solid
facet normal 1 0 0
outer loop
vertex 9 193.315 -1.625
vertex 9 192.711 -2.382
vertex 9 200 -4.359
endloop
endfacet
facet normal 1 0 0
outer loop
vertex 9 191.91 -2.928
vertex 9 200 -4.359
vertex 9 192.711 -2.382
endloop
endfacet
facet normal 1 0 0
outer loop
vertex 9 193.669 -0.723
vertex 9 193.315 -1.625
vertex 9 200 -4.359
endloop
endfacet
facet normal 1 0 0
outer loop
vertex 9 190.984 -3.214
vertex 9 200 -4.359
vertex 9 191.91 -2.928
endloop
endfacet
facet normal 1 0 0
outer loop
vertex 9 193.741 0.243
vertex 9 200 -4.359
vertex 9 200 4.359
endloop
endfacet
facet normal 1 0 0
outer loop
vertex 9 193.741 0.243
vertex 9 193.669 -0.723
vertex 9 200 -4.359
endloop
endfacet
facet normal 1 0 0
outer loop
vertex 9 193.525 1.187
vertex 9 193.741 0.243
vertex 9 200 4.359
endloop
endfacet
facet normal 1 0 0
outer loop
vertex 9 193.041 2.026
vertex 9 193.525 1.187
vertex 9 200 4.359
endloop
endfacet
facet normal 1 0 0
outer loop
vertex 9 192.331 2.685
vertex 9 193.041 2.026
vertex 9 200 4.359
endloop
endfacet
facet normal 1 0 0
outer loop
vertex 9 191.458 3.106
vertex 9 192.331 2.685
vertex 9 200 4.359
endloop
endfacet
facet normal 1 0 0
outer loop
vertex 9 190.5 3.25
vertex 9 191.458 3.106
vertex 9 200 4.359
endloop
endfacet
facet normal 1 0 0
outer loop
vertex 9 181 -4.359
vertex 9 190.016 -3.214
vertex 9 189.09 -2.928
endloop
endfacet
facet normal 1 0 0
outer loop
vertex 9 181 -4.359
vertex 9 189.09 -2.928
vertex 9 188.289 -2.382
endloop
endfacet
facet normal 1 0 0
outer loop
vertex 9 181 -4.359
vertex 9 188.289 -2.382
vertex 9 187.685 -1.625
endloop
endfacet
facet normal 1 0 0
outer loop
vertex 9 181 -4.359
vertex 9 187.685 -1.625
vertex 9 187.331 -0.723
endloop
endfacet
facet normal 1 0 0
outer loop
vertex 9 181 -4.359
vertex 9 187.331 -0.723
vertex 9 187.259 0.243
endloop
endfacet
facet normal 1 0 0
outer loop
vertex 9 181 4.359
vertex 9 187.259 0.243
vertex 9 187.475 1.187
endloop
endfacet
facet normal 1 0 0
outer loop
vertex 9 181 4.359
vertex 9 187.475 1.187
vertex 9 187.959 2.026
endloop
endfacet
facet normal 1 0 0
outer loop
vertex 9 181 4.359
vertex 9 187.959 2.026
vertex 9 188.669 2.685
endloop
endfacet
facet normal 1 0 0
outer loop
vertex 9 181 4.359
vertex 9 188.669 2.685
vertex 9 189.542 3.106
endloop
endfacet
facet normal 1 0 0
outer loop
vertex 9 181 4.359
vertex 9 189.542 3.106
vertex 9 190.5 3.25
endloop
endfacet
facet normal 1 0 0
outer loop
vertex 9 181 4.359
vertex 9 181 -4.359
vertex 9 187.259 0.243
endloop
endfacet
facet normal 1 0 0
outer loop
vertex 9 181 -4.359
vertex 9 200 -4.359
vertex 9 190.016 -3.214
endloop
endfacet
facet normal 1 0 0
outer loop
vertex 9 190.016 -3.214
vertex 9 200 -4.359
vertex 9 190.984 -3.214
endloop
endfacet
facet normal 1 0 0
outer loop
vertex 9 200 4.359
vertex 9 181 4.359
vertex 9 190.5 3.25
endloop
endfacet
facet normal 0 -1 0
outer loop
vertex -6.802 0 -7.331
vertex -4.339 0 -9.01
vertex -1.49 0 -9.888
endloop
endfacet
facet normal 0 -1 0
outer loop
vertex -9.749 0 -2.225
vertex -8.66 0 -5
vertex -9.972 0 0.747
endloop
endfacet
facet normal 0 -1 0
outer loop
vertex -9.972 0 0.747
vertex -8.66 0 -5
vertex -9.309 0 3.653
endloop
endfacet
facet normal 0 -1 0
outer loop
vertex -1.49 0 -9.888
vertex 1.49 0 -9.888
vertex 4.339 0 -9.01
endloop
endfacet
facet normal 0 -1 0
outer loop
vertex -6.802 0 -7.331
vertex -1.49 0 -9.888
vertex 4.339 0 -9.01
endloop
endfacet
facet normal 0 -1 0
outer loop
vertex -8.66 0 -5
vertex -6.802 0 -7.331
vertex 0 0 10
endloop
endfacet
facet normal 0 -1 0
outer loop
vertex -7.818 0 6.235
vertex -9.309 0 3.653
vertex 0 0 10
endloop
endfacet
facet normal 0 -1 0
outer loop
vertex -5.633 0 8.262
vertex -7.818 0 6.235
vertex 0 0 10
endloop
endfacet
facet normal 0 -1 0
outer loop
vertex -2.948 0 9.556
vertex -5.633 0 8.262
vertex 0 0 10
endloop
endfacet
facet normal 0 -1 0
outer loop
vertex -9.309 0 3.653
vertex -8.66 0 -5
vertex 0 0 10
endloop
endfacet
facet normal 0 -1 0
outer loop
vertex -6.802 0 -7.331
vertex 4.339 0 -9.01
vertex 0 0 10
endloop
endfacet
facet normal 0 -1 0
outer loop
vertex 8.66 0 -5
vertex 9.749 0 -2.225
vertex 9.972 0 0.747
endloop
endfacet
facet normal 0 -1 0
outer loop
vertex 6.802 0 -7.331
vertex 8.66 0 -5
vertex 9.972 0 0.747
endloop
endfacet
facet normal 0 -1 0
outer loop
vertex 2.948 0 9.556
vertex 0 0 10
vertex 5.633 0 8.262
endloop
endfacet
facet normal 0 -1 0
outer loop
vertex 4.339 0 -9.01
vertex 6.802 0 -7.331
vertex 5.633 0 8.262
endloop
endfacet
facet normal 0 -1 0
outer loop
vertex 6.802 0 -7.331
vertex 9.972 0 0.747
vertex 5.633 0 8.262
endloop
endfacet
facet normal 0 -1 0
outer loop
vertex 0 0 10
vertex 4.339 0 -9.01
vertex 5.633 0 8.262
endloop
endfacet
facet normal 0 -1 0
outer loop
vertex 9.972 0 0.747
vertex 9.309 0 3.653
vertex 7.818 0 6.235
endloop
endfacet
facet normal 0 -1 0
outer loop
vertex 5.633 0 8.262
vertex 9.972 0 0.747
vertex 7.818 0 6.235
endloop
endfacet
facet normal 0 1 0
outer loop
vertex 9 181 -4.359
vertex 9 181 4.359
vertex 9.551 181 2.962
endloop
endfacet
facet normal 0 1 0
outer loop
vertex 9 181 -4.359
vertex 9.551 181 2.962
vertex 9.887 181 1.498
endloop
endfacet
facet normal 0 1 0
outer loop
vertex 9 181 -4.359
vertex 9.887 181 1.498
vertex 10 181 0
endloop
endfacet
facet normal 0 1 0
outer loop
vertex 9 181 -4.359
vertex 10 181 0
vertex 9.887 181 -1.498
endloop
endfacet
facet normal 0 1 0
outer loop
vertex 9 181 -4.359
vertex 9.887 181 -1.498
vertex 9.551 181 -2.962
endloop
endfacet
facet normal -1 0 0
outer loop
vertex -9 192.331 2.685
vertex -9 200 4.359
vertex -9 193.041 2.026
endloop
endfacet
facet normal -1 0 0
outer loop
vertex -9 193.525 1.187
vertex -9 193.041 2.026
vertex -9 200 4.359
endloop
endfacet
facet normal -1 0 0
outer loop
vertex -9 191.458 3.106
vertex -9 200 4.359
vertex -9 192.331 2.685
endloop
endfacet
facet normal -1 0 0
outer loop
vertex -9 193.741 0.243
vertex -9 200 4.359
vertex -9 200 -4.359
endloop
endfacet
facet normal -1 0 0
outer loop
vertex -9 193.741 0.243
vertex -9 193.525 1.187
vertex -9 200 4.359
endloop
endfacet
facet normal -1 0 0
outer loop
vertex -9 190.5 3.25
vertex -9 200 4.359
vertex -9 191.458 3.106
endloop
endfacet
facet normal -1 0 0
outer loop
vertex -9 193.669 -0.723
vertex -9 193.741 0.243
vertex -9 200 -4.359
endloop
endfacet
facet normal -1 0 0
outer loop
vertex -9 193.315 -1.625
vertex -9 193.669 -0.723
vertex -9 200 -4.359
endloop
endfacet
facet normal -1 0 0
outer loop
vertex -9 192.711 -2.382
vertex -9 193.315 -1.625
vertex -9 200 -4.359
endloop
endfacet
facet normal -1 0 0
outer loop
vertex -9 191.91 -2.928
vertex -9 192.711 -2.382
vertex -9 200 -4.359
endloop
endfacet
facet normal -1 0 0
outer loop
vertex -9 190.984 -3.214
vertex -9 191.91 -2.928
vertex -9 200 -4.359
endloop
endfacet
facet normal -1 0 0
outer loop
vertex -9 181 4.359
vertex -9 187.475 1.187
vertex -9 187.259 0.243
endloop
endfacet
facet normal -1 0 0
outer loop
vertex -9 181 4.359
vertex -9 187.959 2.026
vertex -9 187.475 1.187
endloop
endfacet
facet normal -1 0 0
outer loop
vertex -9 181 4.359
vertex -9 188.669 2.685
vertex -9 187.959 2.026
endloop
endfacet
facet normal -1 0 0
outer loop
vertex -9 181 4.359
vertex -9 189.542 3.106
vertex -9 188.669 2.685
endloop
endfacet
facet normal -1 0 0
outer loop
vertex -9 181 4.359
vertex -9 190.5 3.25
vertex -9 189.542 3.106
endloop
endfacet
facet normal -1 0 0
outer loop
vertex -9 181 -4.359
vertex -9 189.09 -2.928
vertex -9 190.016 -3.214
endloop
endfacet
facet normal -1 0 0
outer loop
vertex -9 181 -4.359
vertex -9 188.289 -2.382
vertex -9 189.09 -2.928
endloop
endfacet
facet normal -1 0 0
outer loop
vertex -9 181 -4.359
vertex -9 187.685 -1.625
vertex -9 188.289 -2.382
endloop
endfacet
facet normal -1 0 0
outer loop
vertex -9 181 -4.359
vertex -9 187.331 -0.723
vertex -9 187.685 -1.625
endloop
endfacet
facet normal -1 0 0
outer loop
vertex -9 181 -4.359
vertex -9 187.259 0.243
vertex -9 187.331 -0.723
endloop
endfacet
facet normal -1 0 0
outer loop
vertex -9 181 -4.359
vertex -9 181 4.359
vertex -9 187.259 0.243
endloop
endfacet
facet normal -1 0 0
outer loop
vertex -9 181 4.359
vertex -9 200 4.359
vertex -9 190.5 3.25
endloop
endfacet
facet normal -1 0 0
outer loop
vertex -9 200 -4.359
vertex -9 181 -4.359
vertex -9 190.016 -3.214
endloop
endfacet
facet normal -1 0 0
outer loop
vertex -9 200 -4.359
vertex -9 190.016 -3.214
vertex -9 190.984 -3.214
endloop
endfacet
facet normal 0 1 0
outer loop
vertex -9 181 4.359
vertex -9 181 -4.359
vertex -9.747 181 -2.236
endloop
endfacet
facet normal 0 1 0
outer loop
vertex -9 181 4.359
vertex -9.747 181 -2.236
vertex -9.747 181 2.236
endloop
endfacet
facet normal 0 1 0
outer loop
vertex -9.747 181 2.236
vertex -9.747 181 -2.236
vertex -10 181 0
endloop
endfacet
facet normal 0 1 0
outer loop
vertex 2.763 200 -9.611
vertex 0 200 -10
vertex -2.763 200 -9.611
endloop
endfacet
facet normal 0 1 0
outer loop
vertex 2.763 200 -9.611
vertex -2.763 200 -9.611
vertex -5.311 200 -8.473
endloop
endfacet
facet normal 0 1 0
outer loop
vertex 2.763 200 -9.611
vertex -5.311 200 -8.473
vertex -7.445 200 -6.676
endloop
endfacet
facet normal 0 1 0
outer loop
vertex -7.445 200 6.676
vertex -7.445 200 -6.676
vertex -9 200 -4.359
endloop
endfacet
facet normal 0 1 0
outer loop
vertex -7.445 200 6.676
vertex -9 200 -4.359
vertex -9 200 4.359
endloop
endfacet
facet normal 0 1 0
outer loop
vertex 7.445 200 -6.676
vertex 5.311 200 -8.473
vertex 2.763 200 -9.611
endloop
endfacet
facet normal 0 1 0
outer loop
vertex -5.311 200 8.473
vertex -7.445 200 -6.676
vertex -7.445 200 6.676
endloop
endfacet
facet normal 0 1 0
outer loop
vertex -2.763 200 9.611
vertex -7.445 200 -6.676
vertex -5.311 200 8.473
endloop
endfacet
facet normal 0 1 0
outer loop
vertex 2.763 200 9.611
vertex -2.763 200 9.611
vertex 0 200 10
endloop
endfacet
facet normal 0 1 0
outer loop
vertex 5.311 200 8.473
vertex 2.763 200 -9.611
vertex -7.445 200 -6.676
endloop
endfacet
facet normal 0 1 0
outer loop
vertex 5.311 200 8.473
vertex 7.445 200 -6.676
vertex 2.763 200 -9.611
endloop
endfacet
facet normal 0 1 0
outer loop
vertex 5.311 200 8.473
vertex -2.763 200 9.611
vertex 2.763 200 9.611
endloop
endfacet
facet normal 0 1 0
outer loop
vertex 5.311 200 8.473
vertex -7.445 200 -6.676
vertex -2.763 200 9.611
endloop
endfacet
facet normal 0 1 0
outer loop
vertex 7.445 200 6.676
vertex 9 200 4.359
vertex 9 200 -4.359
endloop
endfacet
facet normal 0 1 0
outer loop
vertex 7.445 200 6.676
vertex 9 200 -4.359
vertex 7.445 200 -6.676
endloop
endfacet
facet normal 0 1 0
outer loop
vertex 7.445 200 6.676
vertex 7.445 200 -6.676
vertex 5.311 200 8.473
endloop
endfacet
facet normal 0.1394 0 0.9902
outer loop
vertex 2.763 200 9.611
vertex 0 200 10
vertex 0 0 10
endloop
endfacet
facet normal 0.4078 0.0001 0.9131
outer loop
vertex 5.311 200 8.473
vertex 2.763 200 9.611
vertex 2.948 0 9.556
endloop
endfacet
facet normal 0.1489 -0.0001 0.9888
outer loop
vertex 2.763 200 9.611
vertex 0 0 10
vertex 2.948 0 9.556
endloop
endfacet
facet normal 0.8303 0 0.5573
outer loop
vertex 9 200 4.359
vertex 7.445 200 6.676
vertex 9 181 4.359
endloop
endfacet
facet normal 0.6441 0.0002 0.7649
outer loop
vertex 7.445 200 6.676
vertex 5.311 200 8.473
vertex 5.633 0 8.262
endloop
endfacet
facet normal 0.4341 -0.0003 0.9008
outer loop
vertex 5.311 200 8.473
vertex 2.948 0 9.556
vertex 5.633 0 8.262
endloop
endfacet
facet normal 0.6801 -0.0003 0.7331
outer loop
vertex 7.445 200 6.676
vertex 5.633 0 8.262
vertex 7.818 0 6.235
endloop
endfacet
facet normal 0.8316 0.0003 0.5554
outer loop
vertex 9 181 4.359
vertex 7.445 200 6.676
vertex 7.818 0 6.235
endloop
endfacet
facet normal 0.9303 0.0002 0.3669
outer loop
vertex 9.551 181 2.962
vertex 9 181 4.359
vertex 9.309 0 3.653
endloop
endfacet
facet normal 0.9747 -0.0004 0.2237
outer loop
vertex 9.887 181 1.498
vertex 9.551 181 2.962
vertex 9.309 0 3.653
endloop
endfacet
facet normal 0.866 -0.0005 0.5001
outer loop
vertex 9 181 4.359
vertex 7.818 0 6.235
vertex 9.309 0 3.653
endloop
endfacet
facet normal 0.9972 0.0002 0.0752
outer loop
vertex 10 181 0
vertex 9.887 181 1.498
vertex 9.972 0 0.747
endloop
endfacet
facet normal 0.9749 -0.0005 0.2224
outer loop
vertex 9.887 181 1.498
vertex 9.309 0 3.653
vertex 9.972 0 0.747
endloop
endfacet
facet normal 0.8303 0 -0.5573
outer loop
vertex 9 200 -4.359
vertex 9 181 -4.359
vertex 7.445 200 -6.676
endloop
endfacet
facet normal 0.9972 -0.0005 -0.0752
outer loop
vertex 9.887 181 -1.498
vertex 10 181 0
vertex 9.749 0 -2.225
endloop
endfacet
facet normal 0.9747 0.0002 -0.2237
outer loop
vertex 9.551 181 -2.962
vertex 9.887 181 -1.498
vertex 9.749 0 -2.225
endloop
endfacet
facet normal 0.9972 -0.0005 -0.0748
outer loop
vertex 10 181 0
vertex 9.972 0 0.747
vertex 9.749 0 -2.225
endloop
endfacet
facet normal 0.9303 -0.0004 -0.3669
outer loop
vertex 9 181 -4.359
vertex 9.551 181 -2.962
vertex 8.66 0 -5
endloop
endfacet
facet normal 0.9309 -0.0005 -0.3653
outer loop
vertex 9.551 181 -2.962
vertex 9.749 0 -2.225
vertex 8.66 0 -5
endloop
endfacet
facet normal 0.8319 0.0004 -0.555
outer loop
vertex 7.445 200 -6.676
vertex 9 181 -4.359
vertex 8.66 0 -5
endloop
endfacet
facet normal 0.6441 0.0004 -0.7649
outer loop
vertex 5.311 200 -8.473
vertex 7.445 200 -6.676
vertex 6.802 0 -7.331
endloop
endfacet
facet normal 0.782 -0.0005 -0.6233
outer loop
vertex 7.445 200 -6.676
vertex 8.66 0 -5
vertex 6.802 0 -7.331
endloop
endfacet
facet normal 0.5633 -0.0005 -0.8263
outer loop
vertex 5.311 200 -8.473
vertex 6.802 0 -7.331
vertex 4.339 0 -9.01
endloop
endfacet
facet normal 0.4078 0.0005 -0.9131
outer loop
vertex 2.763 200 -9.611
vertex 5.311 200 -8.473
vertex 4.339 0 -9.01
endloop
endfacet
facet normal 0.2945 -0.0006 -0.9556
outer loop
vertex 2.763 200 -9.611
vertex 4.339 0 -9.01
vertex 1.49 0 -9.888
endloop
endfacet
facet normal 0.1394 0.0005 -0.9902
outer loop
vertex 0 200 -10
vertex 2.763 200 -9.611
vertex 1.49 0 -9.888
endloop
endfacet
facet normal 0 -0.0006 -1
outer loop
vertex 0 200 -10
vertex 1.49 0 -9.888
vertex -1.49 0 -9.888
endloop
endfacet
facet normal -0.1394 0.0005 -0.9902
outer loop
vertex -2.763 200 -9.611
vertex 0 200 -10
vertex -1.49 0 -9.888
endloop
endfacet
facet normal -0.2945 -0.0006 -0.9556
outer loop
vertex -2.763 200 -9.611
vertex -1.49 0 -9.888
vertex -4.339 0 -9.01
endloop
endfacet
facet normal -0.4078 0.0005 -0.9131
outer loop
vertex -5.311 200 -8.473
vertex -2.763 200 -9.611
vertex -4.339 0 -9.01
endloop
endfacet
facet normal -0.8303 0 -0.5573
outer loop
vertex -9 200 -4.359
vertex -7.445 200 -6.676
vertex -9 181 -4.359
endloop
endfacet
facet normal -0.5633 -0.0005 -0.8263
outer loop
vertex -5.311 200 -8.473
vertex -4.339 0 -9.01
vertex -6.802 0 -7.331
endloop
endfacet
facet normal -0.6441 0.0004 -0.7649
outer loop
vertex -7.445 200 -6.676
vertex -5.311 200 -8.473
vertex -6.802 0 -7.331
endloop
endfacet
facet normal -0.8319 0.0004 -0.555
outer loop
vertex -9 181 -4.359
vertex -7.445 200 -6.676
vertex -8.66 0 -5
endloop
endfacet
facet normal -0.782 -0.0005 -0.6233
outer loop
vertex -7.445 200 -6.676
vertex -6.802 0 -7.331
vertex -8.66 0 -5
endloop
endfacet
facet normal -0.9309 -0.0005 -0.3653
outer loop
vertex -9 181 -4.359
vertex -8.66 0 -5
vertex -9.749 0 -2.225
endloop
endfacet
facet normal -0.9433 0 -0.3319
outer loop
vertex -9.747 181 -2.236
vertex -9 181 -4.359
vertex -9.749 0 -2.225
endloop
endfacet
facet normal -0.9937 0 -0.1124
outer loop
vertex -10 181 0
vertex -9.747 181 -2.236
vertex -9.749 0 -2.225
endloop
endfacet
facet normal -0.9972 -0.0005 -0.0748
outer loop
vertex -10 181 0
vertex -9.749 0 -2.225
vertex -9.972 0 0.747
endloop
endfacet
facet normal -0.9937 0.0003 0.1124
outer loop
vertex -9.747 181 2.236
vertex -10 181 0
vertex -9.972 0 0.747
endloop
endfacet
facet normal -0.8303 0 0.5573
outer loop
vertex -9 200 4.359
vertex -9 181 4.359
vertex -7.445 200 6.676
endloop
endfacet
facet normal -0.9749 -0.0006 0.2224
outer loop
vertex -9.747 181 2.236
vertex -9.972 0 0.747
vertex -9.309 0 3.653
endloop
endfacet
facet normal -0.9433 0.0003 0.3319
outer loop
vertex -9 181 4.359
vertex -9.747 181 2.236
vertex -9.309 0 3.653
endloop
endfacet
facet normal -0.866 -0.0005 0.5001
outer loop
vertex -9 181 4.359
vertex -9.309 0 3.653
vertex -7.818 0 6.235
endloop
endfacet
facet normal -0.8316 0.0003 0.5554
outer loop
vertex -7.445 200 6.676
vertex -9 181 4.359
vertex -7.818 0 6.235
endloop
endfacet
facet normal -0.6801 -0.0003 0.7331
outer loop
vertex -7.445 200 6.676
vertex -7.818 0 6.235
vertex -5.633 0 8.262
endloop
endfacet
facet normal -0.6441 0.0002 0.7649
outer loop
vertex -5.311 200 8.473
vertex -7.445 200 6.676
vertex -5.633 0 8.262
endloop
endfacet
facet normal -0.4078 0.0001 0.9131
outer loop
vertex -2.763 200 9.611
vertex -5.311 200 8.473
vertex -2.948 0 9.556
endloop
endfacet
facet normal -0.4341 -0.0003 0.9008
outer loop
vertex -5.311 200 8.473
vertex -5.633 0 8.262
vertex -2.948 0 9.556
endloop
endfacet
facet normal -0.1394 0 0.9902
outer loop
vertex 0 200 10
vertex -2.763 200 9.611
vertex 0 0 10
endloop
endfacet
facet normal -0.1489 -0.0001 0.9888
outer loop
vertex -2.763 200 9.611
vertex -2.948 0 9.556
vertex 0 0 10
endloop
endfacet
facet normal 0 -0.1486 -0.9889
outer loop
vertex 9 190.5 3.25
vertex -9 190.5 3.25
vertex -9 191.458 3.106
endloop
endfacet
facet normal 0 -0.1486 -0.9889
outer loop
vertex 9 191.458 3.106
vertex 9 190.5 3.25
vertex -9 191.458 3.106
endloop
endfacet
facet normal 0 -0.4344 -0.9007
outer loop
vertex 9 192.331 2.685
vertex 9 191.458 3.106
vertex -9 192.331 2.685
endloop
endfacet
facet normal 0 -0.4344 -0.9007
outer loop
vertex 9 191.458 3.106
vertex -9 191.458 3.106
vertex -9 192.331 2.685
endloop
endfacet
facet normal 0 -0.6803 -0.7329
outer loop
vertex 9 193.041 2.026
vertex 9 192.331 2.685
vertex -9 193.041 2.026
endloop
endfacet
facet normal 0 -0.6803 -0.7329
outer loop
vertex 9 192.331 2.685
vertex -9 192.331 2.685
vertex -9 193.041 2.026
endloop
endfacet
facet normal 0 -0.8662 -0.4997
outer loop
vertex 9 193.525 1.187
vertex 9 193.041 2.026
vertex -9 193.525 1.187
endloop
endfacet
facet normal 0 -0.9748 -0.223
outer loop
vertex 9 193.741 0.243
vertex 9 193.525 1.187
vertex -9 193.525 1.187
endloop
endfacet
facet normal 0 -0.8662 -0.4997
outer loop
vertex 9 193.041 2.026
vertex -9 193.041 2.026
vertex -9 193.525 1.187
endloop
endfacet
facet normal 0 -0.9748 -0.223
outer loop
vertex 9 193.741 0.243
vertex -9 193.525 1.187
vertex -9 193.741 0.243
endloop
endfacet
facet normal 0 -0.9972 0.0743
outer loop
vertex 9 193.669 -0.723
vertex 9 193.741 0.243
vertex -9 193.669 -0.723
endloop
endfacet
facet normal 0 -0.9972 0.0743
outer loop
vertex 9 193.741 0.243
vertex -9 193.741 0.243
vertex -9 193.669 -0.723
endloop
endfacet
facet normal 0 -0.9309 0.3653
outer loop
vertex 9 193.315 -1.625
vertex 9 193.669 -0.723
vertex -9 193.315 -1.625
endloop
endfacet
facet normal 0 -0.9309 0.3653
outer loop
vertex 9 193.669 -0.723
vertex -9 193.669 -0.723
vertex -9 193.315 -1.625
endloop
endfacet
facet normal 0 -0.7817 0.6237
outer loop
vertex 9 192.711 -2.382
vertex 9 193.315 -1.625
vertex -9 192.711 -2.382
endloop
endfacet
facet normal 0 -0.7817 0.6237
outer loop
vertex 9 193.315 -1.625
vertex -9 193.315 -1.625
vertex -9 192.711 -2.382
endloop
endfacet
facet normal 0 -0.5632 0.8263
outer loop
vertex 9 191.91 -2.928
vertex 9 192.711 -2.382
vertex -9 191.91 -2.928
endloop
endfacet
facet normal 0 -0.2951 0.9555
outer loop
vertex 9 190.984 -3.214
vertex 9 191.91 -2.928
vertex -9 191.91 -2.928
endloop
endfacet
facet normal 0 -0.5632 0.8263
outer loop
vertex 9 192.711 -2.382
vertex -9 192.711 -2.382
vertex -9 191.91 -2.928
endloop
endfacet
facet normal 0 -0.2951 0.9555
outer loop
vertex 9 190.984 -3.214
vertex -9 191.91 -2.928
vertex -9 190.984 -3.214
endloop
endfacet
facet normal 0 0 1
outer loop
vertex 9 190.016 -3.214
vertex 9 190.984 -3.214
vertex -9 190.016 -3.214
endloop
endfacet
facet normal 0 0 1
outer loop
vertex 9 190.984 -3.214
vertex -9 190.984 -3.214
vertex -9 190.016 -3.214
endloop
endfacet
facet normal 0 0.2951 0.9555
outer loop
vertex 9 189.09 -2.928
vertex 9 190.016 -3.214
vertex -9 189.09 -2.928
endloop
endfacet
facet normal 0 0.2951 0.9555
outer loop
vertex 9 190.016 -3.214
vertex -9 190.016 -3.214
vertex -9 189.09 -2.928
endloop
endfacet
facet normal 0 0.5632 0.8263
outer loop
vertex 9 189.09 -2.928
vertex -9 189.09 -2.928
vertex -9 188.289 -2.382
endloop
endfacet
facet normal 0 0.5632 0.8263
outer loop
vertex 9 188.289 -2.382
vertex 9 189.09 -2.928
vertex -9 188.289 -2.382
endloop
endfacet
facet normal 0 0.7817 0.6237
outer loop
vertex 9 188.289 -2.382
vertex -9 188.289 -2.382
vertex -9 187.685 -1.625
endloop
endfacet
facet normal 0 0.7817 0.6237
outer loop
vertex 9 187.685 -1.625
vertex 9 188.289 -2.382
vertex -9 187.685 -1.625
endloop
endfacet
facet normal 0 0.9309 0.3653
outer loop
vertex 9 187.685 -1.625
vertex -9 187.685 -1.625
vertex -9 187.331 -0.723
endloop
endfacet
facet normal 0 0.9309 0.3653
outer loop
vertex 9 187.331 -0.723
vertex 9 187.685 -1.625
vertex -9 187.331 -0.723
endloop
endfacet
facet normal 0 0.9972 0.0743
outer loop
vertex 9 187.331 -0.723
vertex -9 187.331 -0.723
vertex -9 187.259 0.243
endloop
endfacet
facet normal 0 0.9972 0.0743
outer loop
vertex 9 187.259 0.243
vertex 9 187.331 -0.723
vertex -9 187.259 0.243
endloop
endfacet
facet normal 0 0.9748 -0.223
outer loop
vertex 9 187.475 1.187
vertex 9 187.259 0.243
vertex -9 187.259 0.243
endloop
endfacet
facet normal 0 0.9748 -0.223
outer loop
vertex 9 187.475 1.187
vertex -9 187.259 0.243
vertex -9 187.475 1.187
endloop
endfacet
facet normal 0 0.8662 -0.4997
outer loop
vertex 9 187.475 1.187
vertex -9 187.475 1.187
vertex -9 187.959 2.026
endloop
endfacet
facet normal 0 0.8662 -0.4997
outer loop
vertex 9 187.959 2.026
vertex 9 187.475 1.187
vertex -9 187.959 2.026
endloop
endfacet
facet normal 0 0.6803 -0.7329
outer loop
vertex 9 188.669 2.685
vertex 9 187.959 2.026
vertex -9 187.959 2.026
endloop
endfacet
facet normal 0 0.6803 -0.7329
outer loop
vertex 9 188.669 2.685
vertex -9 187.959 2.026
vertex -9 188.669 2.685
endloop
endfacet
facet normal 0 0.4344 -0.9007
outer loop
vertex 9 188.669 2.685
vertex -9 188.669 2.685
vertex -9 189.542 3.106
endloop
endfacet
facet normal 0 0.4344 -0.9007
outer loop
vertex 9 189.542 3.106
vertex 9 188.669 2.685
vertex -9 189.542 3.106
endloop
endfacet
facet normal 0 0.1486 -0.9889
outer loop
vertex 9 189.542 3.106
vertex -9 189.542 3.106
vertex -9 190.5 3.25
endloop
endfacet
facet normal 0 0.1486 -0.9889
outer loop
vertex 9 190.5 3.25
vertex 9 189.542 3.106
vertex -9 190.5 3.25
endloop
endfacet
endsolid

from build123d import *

# Parameters (mm, degrees)
SKETCH_1_R          = 10
EXTRUDE_1_DEPTH     = 200
CUT_EXTRUDE_START   = -19
CUT_EXTRUDE_1_DEPTH = 19
SKETCH_3_R          = 3.25
CUT_EXTRUDE_4_DEPTH = 202.149198358


with BuildPart() as part:
    # 草图1 → 凸台-拉伸1 (new body)
    with BuildSketch(Plane(origin=(0, 0, 0), x_dir=(1, 0, 0), z_dir=(0, 1, 0))):
        with Locations(Location((0, 0, 0), (0, 0, 270))):
            Circle(SKETCH_1_R)
    extrude(amount=EXTRUDE_1_DEPTH)

    # 草图2 → 切除-拉伸1 (cut)
    with BuildSketch(Plane(origin=(0, 200, 0), x_dir=(1, 0, 0), z_dir=(0, 1, 0)).offset(CUT_EXTRUDE_START)):
        with BuildLine():
            Line((-9, -4.358898944), (-9, 4.358898944))
            ThreePointArc((-9, 4.358898944), (-10, 0), (-9, -4.358898944))
        make_face()
        with BuildLine():
            ThreePointArc((10, 0), (9.746794345, 2.236067977), (9, 4.358898944))
            Line((9, 4.358898944), (9, -4.358898944))
            ThreePointArc((9, -4.358898944), (9.746794345, -2.236067977), (10, 0))
        make_face()
    extrude(amount=CUT_EXTRUDE_1_DEPTH, mode=Mode.SUBTRACT)

    # 草图3 → 切除-拉伸4 (cut, through all)
    with BuildSketch(Plane.ZY.offset(9)):
        with Locations((0, 190.5)):
            Circle(SKETCH_3_R)
    extrude(amount=-CUT_EXTRUDE_4_DEPTH, mode=Mode.SUBTRACT)


solid = part.part
